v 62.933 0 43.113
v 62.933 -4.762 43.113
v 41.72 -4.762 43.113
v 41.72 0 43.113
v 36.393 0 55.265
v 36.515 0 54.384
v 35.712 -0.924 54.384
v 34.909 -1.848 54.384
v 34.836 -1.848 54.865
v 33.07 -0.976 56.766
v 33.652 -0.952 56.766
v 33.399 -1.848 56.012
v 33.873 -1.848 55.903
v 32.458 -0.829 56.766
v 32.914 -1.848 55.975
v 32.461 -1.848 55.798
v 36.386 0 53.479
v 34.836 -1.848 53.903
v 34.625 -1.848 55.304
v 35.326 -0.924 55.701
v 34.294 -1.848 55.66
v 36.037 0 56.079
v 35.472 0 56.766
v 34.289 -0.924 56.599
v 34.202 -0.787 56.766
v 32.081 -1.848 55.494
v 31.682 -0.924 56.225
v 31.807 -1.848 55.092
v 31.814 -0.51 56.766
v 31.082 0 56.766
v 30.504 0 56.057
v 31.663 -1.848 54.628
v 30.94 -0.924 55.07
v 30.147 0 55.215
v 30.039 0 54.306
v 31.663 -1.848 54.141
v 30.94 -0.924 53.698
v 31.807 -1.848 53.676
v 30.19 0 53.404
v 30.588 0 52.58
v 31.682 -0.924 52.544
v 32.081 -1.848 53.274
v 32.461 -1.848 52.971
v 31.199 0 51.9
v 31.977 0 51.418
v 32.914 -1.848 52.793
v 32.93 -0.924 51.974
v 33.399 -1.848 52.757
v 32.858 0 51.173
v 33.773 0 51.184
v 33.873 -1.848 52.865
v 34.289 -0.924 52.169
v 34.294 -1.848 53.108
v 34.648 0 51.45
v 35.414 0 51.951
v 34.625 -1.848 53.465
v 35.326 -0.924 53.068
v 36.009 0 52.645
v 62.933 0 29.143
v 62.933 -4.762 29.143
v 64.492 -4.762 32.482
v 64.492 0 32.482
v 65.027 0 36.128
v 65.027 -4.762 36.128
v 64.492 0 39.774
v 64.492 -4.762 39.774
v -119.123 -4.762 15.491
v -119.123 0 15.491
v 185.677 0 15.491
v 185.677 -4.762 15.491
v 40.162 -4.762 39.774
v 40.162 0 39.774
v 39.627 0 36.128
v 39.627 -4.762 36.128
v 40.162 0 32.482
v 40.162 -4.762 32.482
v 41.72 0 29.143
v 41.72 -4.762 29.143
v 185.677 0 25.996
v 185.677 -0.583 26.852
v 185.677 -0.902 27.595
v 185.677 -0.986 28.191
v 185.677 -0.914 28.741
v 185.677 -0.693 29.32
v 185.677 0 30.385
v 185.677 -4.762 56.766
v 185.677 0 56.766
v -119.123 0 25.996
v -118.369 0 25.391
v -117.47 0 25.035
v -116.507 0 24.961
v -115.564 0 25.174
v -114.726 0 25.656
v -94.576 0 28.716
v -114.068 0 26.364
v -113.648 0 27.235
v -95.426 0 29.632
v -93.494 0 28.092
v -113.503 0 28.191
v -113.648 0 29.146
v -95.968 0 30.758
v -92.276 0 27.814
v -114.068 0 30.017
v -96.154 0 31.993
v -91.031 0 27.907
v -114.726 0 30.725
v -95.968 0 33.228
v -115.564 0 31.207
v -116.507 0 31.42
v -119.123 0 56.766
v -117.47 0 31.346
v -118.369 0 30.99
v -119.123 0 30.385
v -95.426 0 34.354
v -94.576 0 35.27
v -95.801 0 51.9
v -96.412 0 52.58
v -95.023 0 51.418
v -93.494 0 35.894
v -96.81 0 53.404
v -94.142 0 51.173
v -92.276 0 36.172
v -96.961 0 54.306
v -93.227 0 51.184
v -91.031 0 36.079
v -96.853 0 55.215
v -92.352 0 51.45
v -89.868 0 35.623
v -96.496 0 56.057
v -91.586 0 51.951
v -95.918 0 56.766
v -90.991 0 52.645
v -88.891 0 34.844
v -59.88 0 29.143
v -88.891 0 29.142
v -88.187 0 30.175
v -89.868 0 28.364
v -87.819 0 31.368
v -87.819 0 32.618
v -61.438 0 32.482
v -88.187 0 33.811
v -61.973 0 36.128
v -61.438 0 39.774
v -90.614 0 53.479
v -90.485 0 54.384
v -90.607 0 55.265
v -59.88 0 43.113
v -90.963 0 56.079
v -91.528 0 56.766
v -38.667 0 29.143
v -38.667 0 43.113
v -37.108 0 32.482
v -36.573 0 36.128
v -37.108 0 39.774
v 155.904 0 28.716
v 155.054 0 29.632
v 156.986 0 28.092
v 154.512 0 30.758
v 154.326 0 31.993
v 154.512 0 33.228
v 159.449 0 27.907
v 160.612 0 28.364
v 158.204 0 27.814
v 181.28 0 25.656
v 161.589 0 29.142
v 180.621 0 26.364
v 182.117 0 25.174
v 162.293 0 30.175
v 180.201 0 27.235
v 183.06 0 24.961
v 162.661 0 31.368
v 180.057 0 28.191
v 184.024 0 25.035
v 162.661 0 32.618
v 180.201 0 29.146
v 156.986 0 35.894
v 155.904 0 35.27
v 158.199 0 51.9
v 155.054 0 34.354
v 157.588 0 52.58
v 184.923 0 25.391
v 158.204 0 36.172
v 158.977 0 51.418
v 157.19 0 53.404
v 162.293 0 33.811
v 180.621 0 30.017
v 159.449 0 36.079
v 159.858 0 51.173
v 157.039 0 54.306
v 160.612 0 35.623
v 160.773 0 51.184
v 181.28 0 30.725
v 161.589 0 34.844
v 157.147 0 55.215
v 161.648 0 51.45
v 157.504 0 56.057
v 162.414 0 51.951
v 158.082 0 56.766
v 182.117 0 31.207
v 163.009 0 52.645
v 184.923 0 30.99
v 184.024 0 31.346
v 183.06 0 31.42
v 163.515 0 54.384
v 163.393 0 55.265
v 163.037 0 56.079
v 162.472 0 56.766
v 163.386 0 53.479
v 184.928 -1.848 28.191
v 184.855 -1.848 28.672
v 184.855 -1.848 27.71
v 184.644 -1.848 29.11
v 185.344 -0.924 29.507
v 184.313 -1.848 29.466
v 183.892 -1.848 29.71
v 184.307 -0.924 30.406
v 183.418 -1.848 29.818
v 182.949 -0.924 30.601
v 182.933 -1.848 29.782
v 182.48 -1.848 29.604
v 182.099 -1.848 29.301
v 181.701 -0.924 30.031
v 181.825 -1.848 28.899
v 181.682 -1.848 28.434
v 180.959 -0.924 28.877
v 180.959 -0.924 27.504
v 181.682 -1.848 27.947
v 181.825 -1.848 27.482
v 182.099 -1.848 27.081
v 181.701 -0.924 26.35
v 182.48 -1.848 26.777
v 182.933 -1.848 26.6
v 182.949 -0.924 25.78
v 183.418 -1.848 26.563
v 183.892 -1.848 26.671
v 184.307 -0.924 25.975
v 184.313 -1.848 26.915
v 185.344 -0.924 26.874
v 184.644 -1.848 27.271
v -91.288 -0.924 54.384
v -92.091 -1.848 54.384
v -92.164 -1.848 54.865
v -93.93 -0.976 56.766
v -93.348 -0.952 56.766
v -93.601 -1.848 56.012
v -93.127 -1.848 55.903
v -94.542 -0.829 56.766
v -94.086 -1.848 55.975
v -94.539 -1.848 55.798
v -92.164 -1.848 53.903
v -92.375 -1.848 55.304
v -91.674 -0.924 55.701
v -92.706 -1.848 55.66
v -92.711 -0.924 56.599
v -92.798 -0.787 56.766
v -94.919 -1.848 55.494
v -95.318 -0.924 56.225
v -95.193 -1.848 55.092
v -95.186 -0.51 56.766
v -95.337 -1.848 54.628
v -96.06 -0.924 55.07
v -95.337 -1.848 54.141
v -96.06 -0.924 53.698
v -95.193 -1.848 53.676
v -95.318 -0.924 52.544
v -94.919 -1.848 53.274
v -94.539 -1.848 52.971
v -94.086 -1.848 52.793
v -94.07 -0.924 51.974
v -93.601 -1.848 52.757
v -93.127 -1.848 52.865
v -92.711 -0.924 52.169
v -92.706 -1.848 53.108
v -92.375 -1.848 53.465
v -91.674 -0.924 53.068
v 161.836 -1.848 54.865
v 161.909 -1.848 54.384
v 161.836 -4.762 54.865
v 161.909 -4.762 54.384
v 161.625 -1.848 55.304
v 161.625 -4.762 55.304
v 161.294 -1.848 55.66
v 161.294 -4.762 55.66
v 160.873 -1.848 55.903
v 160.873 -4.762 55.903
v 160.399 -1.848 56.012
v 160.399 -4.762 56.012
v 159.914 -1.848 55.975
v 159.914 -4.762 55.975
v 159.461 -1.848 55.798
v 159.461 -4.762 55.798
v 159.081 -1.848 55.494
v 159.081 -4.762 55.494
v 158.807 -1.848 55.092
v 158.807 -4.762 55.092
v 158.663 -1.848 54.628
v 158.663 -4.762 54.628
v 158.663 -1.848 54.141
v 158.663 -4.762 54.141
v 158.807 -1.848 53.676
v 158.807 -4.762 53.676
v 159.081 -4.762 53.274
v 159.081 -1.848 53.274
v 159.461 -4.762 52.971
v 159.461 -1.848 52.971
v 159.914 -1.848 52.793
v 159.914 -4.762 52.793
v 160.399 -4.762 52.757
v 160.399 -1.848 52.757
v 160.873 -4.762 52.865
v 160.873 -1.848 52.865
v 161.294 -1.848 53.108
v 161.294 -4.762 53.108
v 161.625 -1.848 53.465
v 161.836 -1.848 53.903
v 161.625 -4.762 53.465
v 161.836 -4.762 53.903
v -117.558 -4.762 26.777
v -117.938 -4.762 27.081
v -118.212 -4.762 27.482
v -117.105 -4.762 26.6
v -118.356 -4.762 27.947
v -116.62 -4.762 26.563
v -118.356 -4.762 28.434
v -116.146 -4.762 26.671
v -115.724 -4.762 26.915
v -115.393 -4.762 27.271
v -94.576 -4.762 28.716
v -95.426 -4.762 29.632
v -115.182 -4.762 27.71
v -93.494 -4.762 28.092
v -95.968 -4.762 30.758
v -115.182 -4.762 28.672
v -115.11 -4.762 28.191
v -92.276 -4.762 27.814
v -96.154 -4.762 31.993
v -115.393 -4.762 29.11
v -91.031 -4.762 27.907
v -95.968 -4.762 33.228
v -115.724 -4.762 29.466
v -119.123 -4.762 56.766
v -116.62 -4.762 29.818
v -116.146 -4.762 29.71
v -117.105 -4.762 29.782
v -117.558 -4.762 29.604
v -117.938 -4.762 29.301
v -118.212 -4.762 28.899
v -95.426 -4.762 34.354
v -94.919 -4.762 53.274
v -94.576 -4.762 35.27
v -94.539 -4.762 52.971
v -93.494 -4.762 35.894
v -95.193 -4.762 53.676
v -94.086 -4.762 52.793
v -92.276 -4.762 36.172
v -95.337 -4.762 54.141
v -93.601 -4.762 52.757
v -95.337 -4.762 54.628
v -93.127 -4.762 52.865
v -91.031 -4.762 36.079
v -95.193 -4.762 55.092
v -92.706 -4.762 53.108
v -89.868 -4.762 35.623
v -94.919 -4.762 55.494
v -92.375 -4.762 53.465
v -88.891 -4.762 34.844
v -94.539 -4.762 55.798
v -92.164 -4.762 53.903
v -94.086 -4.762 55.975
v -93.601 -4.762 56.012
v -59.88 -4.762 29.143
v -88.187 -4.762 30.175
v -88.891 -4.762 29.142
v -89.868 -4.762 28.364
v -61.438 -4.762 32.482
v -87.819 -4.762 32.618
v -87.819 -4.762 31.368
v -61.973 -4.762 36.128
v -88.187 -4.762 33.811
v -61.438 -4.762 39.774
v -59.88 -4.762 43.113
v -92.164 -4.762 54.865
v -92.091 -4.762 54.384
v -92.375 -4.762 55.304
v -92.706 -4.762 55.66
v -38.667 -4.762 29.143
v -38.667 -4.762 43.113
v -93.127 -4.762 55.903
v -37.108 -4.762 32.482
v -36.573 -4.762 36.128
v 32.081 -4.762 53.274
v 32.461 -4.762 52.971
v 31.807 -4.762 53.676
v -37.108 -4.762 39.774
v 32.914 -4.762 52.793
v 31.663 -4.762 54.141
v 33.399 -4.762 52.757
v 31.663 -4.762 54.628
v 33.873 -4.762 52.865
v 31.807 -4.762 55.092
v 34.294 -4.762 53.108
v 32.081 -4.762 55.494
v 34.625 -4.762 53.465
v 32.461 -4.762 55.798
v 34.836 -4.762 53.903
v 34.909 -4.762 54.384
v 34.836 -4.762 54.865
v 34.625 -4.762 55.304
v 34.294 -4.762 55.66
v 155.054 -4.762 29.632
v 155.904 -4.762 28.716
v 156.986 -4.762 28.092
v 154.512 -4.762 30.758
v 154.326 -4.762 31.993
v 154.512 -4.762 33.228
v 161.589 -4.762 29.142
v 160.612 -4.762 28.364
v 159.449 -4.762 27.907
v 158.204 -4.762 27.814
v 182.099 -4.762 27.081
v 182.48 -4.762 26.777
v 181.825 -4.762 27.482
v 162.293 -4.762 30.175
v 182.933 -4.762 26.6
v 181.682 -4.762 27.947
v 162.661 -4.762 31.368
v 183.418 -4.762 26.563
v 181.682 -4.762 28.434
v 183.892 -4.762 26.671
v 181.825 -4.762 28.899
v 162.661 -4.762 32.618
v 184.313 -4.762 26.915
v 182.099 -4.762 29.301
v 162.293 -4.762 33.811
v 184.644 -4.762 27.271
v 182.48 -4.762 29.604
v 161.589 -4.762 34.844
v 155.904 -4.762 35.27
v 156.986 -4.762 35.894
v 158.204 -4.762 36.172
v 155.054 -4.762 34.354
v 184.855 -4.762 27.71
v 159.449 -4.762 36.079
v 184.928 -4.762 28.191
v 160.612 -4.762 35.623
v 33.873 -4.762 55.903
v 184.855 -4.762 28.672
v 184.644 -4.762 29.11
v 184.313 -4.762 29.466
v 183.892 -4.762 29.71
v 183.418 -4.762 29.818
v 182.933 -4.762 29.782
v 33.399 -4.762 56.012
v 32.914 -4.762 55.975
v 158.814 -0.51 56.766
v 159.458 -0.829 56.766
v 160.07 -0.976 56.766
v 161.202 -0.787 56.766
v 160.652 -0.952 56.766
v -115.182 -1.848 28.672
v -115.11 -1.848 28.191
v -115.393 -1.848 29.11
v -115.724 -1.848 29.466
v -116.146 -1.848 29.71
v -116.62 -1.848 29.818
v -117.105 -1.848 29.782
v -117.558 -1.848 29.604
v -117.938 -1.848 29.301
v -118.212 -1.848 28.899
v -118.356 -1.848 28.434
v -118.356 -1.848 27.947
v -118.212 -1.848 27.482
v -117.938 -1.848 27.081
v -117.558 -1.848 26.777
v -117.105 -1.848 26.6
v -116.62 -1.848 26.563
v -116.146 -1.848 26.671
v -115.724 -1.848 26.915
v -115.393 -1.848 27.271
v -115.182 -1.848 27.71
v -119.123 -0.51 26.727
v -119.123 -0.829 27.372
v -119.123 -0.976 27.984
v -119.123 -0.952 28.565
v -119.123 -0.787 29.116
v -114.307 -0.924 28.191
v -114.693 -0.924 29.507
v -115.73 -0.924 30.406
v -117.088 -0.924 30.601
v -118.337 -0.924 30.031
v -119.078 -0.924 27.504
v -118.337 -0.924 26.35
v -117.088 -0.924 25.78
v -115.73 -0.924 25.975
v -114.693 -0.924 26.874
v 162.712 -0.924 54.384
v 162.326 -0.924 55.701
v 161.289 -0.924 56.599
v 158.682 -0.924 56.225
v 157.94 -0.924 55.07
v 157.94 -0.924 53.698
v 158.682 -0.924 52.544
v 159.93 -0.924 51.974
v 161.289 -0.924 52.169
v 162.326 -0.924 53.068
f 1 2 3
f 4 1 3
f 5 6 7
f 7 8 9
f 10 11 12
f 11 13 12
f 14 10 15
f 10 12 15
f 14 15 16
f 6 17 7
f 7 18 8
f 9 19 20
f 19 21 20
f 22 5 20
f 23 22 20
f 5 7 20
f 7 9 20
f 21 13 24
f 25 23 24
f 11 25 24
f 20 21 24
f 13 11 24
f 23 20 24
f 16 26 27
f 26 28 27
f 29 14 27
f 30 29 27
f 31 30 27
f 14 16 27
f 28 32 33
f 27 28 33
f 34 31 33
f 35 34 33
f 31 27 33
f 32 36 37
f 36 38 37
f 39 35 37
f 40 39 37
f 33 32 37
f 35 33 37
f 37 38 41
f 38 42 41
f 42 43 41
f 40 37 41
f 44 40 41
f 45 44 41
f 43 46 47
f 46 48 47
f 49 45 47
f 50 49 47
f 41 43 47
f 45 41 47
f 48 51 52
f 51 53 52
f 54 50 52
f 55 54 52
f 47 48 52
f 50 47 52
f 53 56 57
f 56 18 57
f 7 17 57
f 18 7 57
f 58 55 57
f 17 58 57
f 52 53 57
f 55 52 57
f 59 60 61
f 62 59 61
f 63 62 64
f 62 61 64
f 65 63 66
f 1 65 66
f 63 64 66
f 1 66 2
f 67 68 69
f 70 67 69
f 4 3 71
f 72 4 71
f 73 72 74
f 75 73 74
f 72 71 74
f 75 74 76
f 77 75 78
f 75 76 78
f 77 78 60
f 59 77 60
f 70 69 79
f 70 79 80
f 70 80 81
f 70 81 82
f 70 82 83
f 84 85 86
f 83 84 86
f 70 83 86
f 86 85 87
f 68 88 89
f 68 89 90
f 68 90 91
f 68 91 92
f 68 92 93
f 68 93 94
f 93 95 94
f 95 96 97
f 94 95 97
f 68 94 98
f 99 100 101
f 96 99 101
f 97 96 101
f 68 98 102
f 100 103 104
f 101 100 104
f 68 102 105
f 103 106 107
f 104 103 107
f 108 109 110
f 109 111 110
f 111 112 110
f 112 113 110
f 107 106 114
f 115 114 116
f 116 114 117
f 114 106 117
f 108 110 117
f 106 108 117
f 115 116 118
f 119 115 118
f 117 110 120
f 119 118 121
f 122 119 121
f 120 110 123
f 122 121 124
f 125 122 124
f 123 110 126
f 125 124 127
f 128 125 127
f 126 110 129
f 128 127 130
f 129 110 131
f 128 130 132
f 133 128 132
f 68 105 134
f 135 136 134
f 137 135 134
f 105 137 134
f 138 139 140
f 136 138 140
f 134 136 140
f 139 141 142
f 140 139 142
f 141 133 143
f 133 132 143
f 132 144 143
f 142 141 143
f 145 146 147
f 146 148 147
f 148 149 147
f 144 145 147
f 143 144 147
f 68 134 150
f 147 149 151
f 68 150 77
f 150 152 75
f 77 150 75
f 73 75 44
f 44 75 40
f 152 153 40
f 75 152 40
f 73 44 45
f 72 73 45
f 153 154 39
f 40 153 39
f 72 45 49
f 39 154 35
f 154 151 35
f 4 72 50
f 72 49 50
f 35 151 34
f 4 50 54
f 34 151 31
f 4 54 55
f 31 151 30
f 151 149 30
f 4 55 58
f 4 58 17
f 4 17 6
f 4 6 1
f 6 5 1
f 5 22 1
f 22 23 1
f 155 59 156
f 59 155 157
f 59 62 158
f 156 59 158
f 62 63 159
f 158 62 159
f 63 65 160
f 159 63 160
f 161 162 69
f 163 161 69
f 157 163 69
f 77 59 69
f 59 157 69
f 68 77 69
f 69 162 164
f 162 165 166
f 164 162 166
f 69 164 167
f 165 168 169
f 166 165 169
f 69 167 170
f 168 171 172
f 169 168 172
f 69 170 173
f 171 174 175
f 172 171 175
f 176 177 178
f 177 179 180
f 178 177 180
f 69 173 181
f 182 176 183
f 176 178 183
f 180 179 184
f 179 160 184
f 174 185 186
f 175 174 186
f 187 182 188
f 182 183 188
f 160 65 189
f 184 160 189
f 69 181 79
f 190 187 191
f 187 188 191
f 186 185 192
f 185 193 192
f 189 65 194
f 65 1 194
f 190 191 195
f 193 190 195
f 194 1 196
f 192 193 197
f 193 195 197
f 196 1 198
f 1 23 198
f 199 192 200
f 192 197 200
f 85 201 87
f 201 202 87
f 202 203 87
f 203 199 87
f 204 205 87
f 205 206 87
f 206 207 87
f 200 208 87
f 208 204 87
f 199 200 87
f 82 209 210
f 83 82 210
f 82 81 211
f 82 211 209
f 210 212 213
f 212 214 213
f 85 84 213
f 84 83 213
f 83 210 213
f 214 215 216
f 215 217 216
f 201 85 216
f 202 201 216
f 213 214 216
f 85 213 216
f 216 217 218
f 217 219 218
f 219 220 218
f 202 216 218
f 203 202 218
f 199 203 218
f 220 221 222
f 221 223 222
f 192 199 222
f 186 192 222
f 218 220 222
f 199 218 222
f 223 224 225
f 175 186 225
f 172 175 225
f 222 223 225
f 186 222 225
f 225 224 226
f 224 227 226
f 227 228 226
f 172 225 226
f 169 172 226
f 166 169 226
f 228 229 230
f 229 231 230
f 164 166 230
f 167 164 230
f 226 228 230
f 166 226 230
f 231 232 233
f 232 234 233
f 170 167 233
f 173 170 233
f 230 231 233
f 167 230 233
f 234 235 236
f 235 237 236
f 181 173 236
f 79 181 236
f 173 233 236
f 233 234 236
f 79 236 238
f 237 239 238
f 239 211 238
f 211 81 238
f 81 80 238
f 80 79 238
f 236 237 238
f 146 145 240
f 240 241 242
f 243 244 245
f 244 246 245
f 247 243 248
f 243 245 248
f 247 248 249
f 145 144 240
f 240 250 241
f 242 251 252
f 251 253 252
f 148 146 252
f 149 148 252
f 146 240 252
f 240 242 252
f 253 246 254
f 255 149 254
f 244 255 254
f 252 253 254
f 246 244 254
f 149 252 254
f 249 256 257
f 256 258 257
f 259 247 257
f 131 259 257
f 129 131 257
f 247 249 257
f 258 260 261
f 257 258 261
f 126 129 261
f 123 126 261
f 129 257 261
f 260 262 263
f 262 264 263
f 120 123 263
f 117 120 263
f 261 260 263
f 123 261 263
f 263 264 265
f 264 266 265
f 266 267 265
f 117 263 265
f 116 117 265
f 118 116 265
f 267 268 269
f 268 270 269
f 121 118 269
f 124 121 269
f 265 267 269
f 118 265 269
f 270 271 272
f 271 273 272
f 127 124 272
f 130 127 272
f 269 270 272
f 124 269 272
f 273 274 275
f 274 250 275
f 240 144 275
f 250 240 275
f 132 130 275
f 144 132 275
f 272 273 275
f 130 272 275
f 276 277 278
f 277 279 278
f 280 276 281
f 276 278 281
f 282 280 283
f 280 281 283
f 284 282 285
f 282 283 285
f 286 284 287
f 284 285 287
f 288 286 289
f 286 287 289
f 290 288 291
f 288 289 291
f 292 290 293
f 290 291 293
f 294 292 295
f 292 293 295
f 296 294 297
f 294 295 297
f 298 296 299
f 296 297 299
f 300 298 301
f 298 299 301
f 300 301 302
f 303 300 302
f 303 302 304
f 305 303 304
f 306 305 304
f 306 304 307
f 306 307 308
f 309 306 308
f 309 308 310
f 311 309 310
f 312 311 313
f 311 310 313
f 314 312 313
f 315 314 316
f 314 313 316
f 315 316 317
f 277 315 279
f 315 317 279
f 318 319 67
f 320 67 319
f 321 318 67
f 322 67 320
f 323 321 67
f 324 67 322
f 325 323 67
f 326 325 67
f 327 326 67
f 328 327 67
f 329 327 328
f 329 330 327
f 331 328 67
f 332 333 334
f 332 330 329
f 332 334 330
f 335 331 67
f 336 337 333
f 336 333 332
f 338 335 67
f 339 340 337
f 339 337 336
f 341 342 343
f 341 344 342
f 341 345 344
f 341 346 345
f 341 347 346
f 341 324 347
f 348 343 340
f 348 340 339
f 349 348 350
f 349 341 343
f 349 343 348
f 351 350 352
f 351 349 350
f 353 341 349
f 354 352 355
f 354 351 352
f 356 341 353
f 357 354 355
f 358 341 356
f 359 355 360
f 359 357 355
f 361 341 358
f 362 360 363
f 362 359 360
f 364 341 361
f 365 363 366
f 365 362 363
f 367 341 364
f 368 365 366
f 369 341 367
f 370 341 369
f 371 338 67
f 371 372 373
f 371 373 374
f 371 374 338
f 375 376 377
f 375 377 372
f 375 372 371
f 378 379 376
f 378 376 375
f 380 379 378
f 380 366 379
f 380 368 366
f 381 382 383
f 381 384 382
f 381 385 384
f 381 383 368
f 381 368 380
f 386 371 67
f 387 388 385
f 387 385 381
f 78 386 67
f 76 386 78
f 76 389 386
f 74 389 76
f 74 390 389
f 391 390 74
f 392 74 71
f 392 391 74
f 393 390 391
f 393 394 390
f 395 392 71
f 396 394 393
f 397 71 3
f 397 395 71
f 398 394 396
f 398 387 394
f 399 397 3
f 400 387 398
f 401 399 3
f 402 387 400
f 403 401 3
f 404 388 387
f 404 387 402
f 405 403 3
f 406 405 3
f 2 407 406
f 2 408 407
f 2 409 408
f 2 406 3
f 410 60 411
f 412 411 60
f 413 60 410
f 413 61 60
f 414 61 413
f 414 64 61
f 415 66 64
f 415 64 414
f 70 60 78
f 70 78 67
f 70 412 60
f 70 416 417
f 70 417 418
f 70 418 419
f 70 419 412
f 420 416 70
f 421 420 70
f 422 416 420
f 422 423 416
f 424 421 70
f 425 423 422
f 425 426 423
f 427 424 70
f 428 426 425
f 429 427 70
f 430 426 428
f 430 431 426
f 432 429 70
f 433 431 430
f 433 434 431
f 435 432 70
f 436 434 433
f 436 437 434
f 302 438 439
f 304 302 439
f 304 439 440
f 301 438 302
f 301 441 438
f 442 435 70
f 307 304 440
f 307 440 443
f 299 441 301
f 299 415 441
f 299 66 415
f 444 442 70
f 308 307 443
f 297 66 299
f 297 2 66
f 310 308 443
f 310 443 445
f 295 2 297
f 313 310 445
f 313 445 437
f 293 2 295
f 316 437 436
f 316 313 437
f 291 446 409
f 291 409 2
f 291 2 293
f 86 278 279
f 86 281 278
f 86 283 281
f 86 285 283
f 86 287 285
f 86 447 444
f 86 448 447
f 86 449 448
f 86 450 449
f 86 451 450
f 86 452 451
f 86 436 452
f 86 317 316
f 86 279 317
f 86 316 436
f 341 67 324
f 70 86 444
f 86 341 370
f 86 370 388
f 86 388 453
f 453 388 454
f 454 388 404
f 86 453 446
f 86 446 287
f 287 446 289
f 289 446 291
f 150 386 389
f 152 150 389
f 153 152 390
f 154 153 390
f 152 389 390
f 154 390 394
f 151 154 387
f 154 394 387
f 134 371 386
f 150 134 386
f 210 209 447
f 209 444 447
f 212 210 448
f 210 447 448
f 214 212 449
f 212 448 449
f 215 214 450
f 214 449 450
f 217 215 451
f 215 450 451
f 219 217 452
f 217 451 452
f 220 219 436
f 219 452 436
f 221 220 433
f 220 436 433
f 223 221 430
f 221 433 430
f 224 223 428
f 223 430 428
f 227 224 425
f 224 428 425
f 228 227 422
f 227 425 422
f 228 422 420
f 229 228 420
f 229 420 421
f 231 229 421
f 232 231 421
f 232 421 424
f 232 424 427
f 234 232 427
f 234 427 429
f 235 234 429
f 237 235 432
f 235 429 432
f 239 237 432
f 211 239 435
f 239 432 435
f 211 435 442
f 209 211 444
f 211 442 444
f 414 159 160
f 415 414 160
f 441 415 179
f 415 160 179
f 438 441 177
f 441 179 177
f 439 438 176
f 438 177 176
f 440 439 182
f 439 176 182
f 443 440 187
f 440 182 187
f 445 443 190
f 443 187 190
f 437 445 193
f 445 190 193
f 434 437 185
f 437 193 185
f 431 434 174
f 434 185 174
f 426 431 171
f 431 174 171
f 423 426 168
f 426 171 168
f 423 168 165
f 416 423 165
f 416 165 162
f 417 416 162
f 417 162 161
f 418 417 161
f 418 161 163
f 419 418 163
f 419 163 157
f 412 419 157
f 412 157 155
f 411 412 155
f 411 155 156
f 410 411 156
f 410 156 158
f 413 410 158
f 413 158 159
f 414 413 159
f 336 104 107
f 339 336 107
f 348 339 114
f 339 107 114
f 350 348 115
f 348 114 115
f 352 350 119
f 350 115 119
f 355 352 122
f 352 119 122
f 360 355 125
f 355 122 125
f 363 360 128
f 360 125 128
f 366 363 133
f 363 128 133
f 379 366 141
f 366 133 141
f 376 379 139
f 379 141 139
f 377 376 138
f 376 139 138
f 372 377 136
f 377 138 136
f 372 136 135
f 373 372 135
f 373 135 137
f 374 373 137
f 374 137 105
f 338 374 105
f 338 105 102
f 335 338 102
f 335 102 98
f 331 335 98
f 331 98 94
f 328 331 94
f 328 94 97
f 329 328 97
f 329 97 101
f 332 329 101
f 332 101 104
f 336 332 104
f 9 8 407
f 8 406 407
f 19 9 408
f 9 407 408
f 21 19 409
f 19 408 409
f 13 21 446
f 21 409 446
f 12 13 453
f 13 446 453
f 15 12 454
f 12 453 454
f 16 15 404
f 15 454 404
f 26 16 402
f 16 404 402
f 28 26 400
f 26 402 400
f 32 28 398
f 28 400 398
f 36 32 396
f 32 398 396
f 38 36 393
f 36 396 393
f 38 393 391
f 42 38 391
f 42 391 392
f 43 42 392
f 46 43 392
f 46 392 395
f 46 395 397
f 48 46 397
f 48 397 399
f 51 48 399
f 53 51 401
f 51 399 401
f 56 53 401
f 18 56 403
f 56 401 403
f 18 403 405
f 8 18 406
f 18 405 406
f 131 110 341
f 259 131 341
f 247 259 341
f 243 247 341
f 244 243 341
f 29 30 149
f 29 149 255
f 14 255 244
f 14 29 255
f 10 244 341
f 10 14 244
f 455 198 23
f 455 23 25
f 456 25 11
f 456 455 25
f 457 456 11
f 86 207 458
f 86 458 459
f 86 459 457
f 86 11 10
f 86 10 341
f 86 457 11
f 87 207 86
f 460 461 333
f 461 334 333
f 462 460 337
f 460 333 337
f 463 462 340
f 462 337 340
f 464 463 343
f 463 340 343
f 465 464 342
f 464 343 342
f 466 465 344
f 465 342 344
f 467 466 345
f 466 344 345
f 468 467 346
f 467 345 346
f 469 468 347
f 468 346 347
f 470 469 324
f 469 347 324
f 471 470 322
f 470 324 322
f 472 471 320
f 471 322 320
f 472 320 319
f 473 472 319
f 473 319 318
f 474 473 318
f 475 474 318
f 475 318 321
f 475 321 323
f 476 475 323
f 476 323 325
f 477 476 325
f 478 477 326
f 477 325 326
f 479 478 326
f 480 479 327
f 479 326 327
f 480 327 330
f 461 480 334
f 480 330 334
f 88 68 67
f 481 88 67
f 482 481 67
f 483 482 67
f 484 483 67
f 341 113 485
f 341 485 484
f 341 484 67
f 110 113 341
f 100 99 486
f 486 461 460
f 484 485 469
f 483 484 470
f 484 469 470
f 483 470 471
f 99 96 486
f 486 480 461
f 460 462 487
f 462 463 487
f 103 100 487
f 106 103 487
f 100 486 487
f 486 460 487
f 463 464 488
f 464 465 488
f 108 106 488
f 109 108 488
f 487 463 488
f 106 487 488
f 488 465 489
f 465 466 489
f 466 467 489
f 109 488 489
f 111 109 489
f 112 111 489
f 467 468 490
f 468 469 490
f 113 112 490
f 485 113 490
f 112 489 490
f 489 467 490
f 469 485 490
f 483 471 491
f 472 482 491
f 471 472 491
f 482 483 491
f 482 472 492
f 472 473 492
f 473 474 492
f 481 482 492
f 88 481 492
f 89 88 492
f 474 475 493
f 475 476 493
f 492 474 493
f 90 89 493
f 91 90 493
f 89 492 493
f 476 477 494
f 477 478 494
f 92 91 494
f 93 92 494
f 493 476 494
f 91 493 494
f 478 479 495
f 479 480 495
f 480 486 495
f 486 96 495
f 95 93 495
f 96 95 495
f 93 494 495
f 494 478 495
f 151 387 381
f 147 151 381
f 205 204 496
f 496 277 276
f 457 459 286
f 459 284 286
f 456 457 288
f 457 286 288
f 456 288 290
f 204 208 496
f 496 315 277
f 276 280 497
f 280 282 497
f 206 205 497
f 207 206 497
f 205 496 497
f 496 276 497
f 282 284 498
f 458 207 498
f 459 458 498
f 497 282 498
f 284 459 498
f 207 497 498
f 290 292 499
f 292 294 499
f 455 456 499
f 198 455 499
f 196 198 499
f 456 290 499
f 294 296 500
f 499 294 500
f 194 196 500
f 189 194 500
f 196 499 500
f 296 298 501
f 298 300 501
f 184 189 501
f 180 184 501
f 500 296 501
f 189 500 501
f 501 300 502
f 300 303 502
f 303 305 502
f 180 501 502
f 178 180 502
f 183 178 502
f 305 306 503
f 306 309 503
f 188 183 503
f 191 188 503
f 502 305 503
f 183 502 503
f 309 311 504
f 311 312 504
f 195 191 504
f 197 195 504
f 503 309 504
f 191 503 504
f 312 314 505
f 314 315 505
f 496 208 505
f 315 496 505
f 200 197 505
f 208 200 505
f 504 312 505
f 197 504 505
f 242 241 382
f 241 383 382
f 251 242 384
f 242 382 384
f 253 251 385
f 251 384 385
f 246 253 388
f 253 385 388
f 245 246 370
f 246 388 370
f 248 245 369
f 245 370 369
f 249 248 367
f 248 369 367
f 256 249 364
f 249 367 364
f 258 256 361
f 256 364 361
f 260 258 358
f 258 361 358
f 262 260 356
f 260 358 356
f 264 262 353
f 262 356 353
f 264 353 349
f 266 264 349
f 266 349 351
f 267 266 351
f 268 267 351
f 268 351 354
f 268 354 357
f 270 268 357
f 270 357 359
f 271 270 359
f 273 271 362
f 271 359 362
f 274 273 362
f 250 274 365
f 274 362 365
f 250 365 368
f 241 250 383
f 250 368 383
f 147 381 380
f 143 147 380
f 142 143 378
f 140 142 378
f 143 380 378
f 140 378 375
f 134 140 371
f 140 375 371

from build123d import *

# Parameters (mm, degrees)
F0_W           = 304.8
F0_H           = 41.275
F1_DEPTH       = 4.7625
F3_R           = 4.191
F4_DEPTH       = 4.7635
F5_D           = 3.2639
F5_DEPTH       = 14.605
F5_CSINK_D     = 6.477
F5_CSINK_ANGLE = 82
F5_TIP         = 0.9805744872
F7_DEPTH       = 25.4


with BuildPart() as f1:
    # F0 (on Front) → F1 (new body)
    with BuildSketch(Plane.XZ):
        with Locations((33.2768968371, 36.1280379981)):
            Rectangle(F0_W, F0_H)
    extrude(amount=F1_DEPTH)

    # F3 (on face) → F4 (cut, through all)
    with BuildSketch(Plane(origin=(0, 0, 0), x_dir=(-1, 0, 0), z_dir=(0, 1, 0))):
        with Locations((91.9631031629, 31.9930379981)):
            Circle(F3_R)
        with Locations((-158.5168968371, 31.9930379981)):
            Circle(F3_R)
    extrude(amount=-F4_DEPTH, mode=Mode.SUBTRACT)

    # F5
    with Locations(Plane(origin=(0, 0, 0), x_dir=(-1, 0, 0), z_dir=(0, 1, 0))):
        with Locations((-183.2956468371, 28.1905379981), (-160.2768968371, 54.3842879981), (-33.2768968371, 54.3842879981), (93.7231031629, 54.3842879981), (116.7418531629, 28.1905379981)):
            CounterSinkHole(F5_D / 2, F5_CSINK_D / 2, depth=F5_DEPTH, counter_sink_angle=F5_CSINK_ANGLE)
            with Locations((0, 0, -(F5_DEPTH + F5_TIP / 2))):  # 118° drill point
                Cone(0, F5_D / 2, F5_TIP, mode=Mode.SUBTRACT)

    # F6 (on face) → F7 (cut)
    with BuildSketch(Plane.XZ.offset(4.7625)):
        with BuildLine():
            Line((-38.6665120517, 43.1130379981), (-59.879694274, 43.1130379981))
            ThreePointArc((-59.879694274, 43.1130379981), (-61.9731031629, 36.1280379981), (-59.879694274, 29.1430379981))
            Line((-59.879694274, 29.1430379981), (-38.6665120517, 29.1430379981))
            ThreePointArc((-38.6665120517, 29.1430379981), (-36.5731031629, 36.1280379981), (-38.6665120517, 43.1130379981))
        make_face()
        with BuildLine():
            ThreePointArc((62.9334879483, 29.1430379981), (65.0268968371, 36.1280379981), (62.9334879483, 43.1130379981))
            Line((62.9334879483, 43.1130379981), (41.720305726, 43.1130379981))
            ThreePointArc((41.720305726, 43.1130379981), (39.6268968371, 36.1280379981), (41.720305726, 29.1430379981))
            Line((41.720305726, 29.1430379981), (62.9334879483, 29.1430379981))
        make_face()
    extrude(amount=-F7_DEPTH, mode=Mode.SUBTRACT)


solid = f1.part
